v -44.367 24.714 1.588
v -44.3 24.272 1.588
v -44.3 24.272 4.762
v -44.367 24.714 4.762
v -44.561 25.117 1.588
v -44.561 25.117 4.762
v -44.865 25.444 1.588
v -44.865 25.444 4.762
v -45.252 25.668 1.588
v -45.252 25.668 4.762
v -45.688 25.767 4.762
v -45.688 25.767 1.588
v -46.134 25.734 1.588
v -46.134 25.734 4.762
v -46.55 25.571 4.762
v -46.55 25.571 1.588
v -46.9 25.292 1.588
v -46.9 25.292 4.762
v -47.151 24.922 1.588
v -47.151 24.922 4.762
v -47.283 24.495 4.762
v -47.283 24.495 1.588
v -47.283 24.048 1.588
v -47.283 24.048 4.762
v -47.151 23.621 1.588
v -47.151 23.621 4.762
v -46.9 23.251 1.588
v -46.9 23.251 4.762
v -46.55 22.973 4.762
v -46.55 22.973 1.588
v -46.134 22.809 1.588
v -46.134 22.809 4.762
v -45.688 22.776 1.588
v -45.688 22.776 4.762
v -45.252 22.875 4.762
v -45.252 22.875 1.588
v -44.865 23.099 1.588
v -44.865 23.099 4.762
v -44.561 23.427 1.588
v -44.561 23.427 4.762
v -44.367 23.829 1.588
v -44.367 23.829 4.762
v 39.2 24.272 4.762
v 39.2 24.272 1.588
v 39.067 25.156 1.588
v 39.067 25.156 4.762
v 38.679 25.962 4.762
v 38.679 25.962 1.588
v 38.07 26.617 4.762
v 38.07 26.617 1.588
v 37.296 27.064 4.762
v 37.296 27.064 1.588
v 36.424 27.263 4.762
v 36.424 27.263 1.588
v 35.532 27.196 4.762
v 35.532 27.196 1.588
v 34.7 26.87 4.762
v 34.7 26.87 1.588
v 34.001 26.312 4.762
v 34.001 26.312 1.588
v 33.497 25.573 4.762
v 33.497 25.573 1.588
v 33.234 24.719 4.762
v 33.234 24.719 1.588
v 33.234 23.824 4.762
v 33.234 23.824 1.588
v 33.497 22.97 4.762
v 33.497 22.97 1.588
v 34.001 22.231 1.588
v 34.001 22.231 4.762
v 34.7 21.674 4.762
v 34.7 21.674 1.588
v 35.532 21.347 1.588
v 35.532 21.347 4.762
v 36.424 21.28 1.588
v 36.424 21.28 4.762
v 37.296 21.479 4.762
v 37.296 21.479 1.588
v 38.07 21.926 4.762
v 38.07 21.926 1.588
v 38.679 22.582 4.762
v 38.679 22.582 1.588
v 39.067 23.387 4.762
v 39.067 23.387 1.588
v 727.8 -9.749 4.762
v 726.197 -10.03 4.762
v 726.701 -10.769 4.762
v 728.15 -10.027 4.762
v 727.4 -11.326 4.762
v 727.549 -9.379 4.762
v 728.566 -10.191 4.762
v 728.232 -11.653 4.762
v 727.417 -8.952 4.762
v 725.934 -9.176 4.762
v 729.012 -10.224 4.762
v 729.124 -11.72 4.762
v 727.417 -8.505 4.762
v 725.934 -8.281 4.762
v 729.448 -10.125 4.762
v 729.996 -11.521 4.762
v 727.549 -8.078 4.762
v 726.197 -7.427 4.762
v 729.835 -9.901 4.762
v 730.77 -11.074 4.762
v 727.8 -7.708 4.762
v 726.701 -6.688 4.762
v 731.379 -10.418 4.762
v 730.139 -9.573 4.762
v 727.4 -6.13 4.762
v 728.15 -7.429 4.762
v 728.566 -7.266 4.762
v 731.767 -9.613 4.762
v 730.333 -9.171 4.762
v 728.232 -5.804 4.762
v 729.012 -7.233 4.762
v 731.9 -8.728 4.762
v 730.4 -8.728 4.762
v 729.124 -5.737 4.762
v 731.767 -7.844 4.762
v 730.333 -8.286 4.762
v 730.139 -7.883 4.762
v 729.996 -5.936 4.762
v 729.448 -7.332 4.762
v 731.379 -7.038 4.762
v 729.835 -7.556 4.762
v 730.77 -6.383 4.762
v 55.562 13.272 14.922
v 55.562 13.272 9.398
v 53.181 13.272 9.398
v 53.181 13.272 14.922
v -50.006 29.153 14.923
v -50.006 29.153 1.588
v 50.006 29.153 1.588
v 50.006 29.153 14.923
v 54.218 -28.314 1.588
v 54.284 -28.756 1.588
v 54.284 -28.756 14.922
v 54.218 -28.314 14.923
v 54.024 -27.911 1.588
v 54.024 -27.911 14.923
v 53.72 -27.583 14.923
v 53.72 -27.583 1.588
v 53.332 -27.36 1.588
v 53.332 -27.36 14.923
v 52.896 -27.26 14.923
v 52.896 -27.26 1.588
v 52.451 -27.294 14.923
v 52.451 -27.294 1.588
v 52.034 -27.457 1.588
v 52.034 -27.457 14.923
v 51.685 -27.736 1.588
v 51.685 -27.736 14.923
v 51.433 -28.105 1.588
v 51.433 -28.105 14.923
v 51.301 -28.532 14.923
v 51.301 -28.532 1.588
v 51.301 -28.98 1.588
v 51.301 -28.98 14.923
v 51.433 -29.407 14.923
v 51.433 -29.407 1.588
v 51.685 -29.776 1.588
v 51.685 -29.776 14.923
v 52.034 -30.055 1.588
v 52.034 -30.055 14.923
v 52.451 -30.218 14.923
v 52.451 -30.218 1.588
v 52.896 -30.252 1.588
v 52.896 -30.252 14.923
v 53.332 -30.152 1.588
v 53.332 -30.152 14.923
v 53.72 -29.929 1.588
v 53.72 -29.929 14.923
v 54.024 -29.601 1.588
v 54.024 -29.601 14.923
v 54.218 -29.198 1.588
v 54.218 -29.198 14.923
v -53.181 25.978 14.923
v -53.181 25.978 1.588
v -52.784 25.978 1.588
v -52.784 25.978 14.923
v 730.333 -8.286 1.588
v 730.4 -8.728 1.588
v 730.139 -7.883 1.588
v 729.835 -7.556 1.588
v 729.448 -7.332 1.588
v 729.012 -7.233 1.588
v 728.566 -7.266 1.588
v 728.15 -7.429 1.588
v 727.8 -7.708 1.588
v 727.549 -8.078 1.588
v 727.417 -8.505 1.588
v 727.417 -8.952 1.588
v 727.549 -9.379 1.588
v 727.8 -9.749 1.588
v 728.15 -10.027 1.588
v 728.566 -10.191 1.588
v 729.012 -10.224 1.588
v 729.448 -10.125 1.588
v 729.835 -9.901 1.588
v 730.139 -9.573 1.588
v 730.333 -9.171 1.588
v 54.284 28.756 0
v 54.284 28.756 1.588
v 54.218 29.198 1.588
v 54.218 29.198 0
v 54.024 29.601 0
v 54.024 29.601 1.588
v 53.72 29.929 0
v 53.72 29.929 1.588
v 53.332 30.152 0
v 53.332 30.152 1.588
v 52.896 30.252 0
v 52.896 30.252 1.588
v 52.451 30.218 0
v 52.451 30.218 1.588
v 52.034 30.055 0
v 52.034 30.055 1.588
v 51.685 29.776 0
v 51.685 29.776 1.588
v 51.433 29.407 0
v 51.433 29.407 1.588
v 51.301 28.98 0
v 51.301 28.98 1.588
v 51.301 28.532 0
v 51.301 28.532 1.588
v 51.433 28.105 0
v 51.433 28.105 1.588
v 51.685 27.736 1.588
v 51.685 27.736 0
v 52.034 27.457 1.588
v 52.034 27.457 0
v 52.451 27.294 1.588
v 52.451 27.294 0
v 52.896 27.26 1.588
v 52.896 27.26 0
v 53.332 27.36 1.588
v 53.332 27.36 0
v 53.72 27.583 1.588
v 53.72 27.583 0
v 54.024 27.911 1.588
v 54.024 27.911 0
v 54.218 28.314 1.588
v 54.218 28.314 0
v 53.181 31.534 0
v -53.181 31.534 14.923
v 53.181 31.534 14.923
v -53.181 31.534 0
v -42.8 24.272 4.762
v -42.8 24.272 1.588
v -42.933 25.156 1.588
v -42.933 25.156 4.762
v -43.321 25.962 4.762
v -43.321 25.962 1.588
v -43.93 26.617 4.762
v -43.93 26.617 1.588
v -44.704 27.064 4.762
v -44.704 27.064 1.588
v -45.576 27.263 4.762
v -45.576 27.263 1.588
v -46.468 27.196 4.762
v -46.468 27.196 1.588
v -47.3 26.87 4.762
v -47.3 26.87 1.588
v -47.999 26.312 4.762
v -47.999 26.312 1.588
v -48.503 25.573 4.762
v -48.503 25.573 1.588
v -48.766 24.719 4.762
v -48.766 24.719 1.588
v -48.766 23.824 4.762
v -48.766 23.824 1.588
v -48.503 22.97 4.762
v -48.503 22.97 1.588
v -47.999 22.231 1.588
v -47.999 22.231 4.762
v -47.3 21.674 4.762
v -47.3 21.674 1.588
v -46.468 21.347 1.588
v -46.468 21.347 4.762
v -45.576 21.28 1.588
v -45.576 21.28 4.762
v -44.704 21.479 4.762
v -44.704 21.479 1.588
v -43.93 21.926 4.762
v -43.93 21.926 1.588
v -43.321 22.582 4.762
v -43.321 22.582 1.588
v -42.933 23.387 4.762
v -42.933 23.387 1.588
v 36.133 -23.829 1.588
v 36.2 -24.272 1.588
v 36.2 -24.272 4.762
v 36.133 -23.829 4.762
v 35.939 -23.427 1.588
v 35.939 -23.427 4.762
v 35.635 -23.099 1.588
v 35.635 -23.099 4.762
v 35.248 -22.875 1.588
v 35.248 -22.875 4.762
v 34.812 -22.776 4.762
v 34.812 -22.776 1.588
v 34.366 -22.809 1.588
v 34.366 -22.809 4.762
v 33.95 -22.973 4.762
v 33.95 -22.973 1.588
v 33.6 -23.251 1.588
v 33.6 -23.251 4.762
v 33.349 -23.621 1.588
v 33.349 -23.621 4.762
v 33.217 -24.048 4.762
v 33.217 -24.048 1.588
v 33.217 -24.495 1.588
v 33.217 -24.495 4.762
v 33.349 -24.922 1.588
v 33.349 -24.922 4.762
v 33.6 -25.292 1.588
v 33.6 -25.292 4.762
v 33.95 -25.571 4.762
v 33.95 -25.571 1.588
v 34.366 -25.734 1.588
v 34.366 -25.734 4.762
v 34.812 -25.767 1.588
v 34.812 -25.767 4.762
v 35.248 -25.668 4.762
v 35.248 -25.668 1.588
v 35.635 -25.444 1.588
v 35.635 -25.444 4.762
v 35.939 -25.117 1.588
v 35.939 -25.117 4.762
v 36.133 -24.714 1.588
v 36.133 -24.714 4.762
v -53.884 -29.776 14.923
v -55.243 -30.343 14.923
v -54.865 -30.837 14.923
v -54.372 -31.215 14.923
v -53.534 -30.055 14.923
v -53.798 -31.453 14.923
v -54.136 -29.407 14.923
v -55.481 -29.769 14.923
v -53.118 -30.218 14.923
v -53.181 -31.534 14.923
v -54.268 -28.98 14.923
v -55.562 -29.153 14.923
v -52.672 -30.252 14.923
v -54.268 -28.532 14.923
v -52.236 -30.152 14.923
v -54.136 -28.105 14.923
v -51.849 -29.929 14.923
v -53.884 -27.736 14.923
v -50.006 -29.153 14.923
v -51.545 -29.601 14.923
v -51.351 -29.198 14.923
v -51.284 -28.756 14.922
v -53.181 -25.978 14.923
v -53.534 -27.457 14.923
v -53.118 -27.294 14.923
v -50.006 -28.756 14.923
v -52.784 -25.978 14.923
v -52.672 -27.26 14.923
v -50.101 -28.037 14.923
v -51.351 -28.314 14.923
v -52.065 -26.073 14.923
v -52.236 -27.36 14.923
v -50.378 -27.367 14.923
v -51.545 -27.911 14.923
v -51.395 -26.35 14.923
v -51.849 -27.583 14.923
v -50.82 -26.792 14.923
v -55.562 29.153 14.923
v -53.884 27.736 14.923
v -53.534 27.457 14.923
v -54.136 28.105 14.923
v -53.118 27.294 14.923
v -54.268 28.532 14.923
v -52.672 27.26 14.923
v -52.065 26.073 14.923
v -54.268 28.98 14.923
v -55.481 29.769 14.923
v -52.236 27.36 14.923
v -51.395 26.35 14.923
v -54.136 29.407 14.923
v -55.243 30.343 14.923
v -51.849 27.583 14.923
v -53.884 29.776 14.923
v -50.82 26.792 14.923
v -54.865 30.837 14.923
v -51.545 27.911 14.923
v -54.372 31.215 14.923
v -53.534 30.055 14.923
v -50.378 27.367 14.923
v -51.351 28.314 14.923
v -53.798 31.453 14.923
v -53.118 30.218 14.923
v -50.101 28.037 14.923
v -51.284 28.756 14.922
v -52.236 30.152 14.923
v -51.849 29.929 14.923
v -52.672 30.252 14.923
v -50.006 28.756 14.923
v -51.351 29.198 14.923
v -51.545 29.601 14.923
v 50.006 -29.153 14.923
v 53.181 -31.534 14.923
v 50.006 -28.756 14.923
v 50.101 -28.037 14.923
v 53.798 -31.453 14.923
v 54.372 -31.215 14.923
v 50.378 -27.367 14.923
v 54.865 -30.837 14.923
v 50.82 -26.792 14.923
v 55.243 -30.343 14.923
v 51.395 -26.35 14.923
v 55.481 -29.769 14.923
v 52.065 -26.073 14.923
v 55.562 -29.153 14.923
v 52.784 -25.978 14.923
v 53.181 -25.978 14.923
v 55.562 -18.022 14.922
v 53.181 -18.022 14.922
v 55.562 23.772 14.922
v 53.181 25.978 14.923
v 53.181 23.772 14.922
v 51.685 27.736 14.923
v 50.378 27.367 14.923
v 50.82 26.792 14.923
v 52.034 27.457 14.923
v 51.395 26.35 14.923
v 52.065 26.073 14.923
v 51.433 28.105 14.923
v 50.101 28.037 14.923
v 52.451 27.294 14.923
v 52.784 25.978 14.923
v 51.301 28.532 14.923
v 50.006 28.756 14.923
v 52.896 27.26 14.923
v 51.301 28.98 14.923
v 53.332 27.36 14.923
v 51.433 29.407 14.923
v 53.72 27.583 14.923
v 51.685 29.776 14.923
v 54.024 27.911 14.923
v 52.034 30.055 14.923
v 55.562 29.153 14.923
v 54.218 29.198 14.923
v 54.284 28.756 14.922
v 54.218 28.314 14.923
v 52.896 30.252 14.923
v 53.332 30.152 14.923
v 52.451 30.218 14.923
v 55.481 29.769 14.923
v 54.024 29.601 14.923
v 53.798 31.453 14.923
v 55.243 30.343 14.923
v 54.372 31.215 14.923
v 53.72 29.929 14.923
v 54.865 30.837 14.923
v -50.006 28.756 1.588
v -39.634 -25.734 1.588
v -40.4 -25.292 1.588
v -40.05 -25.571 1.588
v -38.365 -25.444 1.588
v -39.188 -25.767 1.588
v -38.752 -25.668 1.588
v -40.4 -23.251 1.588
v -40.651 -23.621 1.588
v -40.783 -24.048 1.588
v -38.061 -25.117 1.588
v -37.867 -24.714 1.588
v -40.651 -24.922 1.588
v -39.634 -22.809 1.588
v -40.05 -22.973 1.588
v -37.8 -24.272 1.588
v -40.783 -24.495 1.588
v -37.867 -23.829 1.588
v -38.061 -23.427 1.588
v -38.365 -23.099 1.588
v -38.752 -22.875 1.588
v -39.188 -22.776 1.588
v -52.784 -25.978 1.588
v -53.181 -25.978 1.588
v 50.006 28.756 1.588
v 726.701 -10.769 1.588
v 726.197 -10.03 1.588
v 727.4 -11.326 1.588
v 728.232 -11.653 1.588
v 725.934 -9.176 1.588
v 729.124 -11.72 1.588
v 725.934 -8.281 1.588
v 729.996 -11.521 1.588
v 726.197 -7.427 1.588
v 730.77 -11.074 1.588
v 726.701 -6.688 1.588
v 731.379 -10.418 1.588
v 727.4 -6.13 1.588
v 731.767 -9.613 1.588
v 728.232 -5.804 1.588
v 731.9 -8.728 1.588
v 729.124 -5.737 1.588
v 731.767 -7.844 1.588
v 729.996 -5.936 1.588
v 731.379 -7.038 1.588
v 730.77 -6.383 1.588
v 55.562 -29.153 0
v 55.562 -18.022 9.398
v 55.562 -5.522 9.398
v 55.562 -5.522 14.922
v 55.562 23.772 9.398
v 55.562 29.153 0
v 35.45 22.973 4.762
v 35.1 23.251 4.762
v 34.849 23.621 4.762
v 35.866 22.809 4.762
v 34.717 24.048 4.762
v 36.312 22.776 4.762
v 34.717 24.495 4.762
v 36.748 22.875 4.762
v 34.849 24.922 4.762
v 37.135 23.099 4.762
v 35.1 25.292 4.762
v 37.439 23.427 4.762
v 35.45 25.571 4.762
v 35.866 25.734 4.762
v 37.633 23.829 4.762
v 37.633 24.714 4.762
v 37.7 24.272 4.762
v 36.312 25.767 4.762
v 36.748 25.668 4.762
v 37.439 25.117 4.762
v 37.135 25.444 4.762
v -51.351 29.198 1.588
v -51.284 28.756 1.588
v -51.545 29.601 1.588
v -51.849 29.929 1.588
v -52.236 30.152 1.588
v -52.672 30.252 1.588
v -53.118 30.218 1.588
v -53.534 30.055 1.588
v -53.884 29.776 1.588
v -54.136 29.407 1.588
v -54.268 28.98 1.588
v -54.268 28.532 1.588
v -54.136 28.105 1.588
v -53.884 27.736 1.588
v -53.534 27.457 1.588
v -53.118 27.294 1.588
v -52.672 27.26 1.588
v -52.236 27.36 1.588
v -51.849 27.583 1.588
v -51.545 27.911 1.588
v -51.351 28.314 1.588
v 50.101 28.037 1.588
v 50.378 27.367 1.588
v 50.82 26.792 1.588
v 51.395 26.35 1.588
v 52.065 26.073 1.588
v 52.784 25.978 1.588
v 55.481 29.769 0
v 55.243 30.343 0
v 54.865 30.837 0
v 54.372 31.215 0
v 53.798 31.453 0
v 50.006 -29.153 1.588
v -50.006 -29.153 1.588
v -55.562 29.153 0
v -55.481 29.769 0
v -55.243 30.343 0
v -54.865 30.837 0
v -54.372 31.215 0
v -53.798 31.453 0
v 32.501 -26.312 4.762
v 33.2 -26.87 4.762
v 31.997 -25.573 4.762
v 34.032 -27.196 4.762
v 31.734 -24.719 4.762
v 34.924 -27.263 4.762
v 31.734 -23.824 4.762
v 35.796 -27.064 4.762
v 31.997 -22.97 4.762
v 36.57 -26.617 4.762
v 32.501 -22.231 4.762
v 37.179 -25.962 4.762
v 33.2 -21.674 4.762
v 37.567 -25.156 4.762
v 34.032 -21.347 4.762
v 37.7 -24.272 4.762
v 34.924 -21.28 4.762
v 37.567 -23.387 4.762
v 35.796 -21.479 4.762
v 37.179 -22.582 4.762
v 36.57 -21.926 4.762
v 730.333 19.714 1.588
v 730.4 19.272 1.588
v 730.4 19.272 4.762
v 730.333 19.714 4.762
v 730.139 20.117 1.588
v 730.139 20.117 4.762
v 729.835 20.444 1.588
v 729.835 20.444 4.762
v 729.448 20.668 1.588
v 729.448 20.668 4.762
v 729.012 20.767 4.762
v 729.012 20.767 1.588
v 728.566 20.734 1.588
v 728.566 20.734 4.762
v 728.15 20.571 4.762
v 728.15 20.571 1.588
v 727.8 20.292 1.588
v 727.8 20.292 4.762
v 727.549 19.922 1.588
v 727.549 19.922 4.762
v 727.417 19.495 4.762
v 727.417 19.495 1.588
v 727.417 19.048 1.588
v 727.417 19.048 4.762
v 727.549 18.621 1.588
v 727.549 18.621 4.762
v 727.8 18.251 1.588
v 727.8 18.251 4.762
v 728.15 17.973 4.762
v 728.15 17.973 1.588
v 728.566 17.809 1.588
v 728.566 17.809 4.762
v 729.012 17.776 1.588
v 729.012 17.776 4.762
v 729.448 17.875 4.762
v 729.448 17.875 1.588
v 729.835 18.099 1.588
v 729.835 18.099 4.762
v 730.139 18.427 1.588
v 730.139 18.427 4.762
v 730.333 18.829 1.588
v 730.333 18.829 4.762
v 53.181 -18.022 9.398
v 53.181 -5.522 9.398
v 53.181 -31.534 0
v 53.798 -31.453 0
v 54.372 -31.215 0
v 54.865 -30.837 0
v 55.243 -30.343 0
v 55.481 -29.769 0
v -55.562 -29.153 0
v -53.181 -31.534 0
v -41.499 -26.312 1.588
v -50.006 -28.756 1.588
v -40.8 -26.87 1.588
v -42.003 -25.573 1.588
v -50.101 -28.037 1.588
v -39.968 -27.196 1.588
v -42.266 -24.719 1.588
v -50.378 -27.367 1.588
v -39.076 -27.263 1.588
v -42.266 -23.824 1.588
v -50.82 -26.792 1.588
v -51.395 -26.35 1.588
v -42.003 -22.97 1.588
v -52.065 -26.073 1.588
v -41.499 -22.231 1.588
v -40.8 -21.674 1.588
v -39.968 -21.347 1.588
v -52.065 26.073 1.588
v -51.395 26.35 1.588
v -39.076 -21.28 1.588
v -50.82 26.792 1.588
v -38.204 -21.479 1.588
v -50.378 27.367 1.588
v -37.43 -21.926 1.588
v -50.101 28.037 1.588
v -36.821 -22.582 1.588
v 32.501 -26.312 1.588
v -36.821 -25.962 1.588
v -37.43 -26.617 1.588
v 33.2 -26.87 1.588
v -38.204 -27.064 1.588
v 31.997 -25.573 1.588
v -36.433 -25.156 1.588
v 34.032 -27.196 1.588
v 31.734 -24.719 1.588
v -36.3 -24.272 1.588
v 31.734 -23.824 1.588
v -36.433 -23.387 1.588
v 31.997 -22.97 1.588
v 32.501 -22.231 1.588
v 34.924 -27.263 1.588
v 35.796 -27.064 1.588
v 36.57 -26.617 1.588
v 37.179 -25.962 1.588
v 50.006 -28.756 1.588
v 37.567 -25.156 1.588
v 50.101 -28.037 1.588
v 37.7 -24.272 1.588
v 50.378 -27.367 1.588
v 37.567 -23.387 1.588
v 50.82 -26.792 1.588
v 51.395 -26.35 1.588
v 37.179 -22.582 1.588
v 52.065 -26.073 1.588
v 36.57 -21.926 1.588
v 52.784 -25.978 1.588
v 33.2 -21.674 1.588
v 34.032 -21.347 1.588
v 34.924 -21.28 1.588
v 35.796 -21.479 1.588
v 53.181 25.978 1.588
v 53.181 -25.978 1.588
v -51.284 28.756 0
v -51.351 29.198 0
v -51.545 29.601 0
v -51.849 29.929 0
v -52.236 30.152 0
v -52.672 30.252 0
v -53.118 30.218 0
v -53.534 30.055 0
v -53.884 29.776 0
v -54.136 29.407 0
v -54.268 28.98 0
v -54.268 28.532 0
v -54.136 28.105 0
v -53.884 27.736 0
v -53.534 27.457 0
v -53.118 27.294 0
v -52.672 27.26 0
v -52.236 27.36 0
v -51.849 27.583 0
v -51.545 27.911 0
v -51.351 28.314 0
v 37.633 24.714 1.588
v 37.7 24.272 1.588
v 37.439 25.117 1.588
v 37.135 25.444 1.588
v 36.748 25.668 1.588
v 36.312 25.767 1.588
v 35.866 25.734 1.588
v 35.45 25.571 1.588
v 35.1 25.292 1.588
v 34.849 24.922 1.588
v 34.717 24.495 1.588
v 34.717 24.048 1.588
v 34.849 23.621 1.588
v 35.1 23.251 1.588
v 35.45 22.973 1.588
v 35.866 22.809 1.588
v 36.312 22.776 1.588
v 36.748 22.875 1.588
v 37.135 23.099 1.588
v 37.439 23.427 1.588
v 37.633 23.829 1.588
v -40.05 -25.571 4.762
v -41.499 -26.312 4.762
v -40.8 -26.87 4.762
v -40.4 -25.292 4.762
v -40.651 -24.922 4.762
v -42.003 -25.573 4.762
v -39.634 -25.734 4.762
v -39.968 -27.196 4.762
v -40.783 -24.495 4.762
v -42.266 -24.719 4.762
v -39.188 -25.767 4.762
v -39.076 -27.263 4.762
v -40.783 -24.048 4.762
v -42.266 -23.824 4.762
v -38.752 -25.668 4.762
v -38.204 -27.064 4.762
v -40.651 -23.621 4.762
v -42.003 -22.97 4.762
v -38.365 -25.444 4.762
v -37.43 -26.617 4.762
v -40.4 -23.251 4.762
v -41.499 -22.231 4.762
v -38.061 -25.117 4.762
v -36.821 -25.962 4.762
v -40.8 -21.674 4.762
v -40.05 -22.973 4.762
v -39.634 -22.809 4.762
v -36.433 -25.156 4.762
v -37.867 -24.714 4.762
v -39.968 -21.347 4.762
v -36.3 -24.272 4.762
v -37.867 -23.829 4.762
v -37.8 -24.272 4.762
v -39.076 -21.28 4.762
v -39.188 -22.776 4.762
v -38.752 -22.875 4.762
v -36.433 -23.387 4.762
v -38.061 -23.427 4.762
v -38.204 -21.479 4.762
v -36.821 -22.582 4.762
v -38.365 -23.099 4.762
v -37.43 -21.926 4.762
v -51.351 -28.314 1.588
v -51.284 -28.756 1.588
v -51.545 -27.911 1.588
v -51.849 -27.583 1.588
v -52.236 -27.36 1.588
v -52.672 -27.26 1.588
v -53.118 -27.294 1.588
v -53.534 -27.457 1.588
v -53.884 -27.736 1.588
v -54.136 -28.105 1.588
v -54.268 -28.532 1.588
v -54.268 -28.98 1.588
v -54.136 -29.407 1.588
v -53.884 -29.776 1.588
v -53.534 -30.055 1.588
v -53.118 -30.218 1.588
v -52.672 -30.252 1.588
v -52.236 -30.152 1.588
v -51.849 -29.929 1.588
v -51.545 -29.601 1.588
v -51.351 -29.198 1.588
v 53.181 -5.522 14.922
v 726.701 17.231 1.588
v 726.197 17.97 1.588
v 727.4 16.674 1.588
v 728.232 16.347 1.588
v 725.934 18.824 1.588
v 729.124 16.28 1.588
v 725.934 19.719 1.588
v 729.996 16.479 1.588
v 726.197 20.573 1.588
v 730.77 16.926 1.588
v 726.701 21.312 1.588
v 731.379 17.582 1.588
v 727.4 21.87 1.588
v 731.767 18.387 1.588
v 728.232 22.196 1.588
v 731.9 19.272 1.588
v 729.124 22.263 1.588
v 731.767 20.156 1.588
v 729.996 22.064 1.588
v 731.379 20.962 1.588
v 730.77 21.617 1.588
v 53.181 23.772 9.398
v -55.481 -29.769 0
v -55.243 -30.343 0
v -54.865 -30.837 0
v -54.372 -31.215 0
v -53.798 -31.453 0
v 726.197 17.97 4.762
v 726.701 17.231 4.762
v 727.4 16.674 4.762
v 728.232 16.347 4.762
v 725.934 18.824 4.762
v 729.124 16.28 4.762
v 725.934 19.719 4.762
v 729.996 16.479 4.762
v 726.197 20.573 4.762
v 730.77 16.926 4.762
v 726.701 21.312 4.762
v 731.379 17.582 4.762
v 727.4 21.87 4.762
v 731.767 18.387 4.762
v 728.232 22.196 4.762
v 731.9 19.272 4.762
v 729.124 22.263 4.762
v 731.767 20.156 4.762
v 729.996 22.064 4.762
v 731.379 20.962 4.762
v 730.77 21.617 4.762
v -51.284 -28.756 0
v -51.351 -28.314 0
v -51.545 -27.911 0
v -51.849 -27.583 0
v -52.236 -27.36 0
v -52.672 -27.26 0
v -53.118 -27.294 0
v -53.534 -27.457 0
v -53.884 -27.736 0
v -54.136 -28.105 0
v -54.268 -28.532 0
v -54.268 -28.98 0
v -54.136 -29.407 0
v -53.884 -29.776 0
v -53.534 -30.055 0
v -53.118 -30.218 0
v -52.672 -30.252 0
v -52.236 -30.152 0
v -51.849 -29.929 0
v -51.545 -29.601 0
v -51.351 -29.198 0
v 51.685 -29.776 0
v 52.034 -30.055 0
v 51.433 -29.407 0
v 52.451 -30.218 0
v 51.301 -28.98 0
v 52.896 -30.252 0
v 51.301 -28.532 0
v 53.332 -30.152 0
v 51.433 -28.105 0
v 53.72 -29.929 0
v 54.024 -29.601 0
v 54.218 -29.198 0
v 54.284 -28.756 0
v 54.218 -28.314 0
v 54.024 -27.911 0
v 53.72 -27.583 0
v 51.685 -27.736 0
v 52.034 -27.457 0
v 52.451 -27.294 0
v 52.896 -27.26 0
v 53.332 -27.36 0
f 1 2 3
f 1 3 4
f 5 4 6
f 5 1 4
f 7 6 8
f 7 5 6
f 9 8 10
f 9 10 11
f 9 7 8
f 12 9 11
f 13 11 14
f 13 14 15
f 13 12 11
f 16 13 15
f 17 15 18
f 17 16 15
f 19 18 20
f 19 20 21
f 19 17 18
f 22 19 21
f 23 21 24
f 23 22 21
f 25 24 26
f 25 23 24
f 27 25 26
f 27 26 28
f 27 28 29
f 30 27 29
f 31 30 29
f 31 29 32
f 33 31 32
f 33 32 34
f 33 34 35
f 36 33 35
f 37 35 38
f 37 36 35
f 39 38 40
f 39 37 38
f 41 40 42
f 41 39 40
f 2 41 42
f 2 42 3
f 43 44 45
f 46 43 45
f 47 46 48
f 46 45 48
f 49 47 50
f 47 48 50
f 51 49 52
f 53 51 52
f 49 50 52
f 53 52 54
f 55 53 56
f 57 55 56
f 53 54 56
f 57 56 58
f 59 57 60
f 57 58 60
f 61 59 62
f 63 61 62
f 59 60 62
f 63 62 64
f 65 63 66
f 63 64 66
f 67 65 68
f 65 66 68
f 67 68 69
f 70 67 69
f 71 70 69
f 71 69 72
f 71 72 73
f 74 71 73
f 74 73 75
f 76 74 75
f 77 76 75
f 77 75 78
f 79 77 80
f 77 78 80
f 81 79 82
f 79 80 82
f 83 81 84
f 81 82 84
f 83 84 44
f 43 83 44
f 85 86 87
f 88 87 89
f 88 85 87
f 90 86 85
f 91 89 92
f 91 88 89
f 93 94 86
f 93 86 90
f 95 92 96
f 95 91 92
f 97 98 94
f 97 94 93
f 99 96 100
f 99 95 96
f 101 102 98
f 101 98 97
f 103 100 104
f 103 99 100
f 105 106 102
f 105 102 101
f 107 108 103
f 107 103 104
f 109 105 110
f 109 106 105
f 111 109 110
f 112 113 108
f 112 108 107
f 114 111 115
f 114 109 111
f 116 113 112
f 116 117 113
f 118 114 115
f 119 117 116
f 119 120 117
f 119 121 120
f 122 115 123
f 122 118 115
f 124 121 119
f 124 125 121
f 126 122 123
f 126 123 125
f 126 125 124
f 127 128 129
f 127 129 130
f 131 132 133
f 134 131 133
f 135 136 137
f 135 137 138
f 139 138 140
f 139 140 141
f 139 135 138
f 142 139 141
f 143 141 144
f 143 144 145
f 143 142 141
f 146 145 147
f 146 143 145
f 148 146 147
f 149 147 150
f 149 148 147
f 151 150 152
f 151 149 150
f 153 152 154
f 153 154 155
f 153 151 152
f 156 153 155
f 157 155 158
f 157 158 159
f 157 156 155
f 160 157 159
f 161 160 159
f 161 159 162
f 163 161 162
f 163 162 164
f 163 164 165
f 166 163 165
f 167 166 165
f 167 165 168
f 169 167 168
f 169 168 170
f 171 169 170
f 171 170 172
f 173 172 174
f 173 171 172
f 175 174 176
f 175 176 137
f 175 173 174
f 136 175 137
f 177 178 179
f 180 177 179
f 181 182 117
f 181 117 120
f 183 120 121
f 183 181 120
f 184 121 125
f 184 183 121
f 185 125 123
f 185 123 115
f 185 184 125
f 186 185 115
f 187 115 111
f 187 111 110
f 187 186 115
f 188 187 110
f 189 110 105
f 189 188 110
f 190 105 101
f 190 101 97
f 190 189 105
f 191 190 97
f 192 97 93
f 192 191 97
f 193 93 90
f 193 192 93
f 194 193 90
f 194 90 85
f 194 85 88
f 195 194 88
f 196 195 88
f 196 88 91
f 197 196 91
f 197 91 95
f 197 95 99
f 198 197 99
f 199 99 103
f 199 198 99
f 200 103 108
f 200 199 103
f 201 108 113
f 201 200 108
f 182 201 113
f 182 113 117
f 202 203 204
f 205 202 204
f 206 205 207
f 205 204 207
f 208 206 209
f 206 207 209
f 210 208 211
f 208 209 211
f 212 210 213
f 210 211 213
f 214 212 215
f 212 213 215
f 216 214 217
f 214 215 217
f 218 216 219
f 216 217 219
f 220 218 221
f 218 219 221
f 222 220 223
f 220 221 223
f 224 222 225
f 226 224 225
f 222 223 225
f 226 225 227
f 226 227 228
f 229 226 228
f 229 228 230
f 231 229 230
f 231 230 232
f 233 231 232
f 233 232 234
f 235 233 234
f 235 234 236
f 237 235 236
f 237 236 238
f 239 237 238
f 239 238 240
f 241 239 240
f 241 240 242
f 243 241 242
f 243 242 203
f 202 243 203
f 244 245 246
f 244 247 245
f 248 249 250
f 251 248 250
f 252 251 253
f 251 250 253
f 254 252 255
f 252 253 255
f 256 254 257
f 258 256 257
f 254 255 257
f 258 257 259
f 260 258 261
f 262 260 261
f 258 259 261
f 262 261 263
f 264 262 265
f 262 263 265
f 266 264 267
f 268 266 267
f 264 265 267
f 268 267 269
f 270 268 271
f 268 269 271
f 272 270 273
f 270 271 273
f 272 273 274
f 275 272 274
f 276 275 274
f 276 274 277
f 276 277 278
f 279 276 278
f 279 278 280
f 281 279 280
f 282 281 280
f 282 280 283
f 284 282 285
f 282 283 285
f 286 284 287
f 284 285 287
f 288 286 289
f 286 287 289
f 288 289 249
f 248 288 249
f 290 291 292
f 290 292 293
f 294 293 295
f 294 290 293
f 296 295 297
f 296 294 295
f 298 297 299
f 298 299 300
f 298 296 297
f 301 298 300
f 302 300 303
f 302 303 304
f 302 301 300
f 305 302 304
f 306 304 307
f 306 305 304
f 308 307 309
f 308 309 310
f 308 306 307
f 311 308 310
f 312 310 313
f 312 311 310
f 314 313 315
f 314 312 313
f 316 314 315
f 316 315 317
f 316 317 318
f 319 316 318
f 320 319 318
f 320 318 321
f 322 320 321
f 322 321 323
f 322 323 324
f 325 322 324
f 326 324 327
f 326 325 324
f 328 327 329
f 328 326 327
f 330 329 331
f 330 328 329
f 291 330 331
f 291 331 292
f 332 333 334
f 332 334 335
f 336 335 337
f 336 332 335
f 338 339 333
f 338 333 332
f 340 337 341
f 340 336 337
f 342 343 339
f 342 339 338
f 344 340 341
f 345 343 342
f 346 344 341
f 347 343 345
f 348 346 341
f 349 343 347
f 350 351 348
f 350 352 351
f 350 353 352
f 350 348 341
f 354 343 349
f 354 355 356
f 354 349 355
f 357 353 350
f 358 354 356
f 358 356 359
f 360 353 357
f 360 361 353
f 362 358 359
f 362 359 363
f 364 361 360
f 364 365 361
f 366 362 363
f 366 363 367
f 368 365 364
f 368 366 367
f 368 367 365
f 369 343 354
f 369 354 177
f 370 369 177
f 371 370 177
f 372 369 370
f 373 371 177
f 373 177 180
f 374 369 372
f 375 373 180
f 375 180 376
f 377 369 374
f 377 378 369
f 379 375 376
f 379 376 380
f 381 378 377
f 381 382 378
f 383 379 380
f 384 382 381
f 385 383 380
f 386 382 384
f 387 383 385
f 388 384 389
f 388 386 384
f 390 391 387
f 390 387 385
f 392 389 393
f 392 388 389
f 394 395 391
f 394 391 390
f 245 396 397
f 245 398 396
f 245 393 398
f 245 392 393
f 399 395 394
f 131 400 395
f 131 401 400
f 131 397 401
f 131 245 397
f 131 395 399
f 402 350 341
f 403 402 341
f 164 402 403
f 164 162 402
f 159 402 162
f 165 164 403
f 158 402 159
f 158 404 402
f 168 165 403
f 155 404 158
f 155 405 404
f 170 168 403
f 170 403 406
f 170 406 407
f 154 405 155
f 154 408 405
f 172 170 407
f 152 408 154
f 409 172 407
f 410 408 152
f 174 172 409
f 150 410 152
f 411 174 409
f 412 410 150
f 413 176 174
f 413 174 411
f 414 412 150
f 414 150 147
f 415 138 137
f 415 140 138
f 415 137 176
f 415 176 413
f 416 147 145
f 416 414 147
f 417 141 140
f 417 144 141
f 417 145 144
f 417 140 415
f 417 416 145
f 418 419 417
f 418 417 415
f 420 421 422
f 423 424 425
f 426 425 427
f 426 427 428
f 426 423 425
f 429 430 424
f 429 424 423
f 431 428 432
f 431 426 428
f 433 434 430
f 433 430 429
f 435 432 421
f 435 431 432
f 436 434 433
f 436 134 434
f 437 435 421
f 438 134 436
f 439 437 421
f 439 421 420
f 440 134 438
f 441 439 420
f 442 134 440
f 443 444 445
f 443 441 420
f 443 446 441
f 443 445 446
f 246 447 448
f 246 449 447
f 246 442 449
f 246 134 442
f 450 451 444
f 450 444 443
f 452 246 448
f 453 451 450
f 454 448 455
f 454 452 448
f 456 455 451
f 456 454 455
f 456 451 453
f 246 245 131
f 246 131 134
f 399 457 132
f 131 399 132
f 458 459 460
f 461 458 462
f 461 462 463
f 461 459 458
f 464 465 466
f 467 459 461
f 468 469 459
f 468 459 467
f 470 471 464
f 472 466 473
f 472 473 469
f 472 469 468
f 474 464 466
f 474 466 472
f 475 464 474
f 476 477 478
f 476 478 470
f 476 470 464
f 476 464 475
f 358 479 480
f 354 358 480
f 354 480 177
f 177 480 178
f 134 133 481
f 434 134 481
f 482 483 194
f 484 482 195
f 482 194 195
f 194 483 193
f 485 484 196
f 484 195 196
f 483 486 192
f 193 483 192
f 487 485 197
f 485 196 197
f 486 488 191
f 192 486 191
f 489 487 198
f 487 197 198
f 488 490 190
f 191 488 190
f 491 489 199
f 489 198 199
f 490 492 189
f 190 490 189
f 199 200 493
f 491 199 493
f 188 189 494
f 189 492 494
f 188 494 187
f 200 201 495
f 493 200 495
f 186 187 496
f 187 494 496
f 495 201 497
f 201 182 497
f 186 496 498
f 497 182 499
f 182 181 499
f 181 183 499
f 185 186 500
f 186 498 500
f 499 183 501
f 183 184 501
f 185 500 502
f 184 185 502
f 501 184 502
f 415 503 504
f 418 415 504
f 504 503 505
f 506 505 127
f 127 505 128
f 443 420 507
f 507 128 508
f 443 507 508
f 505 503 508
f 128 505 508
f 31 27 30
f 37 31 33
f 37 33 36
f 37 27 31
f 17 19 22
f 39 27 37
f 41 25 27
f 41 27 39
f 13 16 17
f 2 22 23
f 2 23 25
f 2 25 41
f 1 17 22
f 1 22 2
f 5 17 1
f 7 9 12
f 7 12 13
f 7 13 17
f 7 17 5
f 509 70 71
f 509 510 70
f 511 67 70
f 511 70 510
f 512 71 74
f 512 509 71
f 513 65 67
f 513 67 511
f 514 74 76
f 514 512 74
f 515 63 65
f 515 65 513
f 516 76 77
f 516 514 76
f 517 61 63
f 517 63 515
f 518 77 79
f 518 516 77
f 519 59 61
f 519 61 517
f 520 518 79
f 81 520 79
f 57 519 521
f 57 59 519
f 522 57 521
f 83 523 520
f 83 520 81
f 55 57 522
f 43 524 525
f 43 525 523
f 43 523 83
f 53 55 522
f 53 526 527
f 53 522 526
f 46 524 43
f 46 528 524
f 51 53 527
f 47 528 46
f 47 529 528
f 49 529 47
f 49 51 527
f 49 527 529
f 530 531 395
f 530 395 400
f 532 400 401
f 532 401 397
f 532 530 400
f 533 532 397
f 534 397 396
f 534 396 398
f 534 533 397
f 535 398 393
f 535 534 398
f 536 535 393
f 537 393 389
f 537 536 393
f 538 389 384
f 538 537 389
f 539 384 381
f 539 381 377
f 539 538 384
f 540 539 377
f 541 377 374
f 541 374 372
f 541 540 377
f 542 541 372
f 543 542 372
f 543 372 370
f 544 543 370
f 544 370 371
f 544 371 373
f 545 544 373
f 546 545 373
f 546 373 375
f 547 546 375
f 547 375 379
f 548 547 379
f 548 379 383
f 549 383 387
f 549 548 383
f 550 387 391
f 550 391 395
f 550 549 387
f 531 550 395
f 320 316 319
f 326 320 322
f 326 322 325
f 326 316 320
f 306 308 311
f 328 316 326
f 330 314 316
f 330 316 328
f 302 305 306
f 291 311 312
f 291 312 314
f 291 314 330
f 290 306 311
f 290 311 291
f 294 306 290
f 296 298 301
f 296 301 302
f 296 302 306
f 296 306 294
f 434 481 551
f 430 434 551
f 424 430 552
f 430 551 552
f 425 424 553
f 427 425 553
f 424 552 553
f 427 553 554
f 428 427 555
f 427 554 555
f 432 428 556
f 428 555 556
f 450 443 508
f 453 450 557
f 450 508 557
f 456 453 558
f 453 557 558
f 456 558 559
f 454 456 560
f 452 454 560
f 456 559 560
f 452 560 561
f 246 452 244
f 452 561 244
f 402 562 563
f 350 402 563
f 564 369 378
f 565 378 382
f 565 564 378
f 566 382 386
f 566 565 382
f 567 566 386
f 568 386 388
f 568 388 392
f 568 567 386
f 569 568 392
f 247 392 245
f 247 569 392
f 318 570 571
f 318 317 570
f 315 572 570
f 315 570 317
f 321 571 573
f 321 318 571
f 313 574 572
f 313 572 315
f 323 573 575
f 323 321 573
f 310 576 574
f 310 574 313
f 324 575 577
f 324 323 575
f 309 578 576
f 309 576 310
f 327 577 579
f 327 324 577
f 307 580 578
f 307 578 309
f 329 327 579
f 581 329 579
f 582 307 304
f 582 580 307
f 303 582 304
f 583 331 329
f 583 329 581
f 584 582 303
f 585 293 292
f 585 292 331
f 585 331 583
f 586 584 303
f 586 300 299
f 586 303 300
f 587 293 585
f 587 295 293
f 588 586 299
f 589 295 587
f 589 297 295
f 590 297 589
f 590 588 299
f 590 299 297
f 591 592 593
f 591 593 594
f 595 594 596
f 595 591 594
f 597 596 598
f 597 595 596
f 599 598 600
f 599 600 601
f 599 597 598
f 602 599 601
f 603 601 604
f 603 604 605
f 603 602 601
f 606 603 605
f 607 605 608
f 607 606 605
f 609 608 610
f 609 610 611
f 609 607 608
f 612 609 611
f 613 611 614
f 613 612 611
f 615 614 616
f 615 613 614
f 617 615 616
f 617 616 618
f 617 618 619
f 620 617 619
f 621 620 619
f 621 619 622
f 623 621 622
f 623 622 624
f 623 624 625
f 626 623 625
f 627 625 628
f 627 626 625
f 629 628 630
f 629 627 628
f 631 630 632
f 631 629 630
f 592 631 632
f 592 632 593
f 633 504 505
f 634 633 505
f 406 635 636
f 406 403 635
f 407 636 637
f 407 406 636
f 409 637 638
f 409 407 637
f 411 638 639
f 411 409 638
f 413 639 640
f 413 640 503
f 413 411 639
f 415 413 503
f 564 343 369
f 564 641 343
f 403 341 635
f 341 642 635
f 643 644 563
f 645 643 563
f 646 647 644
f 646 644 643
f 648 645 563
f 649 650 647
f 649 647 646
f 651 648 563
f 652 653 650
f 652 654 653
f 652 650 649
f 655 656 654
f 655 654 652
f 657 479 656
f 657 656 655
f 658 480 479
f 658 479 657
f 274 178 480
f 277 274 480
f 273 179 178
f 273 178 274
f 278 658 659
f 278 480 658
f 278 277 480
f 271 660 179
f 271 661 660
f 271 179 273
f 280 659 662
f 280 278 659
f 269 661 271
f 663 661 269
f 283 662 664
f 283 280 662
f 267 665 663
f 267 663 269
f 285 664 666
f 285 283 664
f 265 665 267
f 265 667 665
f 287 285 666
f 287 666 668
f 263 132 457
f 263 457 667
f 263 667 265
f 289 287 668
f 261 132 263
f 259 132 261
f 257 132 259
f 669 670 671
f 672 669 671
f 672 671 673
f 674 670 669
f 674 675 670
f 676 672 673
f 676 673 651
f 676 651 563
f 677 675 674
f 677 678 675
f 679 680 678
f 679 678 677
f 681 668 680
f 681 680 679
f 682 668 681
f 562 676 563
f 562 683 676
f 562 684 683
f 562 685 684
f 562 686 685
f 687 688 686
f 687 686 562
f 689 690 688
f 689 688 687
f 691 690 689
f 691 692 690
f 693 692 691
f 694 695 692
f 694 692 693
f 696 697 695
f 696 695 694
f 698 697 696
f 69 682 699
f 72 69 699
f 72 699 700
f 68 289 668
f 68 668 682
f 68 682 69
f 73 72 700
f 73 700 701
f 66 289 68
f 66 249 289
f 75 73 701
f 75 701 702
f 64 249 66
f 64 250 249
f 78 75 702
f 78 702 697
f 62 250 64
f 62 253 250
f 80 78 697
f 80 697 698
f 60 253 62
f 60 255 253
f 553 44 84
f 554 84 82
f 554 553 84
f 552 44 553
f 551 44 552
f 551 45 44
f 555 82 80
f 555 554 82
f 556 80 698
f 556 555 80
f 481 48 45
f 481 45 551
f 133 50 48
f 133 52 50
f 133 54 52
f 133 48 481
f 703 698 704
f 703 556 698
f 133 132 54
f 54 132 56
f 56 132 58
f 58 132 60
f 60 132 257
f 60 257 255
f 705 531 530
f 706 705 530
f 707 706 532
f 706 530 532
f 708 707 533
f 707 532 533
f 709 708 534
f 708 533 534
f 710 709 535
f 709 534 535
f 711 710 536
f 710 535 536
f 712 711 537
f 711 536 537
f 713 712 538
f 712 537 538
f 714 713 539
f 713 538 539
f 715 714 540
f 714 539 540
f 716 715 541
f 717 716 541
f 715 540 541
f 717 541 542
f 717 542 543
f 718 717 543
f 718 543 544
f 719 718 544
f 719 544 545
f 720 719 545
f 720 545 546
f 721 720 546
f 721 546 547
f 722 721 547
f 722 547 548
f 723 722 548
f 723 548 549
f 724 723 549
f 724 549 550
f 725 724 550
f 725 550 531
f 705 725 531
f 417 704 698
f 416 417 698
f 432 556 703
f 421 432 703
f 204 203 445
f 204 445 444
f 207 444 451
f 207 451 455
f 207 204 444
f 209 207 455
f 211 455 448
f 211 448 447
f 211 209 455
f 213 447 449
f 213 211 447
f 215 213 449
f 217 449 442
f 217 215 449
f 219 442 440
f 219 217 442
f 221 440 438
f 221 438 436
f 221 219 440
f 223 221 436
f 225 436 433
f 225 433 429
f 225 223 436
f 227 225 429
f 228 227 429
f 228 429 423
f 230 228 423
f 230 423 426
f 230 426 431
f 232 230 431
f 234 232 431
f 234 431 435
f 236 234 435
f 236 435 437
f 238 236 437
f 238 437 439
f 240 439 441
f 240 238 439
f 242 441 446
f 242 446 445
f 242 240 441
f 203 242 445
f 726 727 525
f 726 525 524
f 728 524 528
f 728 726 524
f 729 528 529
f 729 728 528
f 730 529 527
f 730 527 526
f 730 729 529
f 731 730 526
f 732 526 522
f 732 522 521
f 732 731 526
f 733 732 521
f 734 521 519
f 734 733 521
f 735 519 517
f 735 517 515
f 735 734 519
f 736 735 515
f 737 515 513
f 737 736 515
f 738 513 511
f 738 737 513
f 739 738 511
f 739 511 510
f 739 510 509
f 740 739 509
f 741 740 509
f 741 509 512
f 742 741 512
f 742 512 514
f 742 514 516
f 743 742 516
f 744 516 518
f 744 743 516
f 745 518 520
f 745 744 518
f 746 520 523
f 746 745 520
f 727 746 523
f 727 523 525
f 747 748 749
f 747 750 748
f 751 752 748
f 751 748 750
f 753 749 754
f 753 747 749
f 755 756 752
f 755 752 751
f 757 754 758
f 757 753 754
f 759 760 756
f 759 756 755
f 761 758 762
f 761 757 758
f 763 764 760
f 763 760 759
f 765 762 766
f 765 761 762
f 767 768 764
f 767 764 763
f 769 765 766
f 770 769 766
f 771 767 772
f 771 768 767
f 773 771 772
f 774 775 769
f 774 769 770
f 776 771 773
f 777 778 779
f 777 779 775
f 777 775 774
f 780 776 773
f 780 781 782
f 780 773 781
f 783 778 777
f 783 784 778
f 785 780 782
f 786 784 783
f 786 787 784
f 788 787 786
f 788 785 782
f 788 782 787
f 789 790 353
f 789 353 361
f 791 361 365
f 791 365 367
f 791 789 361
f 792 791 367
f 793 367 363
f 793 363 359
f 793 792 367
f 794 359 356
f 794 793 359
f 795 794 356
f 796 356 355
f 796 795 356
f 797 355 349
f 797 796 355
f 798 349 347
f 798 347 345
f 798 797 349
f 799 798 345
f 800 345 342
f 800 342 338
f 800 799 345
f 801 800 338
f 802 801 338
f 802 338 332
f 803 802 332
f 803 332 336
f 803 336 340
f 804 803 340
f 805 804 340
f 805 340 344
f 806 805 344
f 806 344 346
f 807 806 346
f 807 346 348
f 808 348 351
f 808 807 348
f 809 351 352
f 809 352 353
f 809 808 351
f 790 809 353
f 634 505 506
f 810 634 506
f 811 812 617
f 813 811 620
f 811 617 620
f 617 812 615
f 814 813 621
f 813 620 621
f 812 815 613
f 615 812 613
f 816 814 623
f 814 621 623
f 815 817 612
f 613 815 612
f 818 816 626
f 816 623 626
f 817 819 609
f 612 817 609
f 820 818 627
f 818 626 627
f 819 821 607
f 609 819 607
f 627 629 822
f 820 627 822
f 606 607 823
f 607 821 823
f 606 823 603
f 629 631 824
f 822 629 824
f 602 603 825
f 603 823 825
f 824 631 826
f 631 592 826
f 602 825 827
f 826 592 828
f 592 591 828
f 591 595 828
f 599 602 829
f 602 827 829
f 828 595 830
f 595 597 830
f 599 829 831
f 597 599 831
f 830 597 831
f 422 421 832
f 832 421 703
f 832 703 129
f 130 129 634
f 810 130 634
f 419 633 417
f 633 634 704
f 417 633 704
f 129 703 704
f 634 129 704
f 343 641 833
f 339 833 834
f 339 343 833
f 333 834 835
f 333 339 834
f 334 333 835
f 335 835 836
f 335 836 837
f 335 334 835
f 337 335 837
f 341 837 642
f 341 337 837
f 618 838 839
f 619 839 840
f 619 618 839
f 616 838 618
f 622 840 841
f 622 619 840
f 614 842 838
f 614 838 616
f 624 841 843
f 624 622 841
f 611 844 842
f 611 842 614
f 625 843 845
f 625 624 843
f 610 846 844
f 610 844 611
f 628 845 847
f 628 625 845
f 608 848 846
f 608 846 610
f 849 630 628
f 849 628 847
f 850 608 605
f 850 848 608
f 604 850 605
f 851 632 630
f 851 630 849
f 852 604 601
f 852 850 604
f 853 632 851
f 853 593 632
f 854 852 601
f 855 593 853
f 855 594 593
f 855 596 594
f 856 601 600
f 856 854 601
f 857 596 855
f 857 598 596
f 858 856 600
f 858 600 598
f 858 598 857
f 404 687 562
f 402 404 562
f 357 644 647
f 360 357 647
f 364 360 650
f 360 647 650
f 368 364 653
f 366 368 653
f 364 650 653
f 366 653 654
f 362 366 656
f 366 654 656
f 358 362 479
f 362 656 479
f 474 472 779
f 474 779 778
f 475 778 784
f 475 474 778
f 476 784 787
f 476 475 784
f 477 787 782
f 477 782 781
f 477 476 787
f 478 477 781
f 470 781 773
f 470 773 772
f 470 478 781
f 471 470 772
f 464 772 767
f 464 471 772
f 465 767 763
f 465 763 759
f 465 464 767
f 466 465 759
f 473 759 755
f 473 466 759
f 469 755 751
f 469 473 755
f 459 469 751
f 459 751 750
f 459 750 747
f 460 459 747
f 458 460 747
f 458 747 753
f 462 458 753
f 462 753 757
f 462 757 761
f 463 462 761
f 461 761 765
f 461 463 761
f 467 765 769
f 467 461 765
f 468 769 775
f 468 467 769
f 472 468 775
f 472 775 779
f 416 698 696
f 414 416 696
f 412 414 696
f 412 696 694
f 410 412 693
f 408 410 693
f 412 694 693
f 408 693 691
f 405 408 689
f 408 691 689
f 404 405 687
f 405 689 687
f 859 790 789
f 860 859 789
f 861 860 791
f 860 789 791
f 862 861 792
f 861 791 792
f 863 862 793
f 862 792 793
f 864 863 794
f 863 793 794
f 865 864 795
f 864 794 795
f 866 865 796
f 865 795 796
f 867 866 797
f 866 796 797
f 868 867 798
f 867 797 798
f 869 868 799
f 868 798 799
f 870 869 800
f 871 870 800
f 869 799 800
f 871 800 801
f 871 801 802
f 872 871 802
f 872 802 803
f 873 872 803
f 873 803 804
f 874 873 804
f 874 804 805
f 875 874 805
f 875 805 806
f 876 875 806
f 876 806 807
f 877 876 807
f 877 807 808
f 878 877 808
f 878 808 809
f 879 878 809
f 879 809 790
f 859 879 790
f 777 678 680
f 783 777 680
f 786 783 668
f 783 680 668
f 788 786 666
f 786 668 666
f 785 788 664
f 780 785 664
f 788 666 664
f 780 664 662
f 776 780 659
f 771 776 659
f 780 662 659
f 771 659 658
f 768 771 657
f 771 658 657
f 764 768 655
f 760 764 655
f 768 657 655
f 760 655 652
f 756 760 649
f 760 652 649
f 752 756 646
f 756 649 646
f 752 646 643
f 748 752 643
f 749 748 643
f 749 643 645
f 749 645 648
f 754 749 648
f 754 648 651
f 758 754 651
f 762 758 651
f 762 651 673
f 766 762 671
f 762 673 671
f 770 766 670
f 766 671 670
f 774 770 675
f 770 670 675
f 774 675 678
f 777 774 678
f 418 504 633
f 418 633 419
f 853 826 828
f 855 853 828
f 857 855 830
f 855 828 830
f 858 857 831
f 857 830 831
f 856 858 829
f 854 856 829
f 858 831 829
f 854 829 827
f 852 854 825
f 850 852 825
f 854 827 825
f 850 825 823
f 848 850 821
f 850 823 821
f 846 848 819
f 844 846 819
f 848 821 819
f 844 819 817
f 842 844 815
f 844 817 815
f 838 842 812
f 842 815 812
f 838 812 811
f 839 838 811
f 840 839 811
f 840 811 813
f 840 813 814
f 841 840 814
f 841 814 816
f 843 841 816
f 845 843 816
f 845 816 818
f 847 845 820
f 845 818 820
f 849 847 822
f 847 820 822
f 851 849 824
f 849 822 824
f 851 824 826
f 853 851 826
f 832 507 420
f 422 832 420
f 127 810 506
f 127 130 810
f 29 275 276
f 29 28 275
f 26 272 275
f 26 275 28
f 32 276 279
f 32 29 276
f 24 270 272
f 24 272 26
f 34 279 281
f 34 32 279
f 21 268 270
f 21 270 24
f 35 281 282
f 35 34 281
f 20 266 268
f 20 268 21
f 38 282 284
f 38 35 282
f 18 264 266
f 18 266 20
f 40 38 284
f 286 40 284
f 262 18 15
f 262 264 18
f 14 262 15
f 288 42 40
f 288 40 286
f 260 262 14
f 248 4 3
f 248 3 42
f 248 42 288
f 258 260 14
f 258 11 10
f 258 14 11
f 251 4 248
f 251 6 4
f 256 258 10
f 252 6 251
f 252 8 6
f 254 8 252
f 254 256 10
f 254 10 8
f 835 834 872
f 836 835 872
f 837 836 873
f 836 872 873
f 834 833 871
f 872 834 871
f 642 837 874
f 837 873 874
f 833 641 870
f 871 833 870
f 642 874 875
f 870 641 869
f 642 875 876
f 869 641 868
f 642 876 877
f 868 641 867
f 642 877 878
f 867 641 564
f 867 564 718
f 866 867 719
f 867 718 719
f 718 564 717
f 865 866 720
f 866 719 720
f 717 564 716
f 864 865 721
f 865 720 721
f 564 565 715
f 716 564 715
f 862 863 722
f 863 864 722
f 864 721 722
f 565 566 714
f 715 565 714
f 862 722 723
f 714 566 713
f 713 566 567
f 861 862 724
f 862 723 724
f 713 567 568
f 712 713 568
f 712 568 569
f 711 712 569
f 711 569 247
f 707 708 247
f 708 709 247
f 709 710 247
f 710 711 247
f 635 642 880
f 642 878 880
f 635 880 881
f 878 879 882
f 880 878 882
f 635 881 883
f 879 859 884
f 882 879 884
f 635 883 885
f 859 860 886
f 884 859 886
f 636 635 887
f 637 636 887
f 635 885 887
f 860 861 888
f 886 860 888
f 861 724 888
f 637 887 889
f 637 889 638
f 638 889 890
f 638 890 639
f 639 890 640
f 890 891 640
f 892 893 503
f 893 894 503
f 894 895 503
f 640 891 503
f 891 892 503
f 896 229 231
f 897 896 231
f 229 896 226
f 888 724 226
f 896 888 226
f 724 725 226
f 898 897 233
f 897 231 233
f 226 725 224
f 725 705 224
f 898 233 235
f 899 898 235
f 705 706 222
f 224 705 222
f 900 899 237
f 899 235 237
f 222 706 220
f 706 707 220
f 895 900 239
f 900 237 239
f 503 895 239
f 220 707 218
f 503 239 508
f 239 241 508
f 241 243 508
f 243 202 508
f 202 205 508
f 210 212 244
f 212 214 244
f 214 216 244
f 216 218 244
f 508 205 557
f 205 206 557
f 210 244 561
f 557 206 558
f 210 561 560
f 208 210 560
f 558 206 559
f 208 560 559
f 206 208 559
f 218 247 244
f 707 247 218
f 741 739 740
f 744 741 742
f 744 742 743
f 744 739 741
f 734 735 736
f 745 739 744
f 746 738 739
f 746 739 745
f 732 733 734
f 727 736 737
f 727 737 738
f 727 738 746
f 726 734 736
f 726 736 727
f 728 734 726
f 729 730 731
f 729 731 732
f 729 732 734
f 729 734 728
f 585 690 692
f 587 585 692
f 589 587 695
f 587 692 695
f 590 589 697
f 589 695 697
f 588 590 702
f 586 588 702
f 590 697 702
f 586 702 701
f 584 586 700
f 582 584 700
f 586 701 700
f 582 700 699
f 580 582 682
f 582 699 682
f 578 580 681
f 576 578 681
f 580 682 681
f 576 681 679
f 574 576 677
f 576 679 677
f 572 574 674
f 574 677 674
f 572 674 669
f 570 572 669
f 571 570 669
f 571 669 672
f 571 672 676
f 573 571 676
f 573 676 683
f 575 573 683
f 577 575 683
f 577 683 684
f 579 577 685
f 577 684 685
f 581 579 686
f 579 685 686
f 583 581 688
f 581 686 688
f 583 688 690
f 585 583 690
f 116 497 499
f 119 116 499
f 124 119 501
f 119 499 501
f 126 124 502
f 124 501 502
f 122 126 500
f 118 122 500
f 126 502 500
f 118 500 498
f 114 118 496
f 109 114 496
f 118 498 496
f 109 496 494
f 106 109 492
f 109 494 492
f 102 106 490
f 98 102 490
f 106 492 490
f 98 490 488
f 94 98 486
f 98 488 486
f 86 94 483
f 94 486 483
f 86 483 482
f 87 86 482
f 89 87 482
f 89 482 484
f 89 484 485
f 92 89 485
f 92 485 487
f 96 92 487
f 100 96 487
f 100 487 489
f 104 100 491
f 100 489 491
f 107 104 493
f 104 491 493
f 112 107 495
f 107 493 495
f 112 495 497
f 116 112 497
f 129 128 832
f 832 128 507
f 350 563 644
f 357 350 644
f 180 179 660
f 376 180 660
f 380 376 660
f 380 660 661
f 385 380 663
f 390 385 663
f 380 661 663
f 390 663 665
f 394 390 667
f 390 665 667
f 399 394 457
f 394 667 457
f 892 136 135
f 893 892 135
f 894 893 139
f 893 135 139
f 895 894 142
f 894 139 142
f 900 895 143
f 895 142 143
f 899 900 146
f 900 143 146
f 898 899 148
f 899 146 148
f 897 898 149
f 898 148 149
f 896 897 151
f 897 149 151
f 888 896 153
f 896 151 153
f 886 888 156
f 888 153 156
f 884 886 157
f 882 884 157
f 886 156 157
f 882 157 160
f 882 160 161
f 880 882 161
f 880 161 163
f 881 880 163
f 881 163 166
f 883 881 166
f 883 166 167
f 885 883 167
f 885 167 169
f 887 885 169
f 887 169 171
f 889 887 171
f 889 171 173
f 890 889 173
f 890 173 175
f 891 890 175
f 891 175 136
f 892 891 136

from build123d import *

# Parameters (mm, degrees)
F1_W      = 111.125
F1_H      = 63.0682
F2_DEPTH  = 1.5875
F3_W      = 111.125
F3_H      = 63.0682
F3_R      = 1.5
F4_DEPTH  = 13.335
F5_R      = 2.38125
F6_W      = 12.5
F6_H      = 5.5245
F6_W_2    = 10.5
F7_DEPTH  = 2.38125
F8_R      = 3
F8_R_2    = 1.5
F9_DEPTH  = 3.175
F10_R     = 1.5
F11_DEPTH = 14.9235


with BuildPart() as f2:
    # F1 (on Top) → F2 (new body)
    with BuildSketch(Plane.XY):
        Rectangle(F1_W, F1_H)
    extrude(amount=F2_DEPTH)

    # F3 (on face) → F4 (join)
    with BuildSketch(Plane.XY.offset(1.5875)):
        Rectangle(F3_W, F3_H)
        with Locations((-52.784375, -28.755975)):
            Circle(F3_R, mode=Mode.SUBTRACT)
        with Locations((52.784375, -28.755975)):
            Circle(F3_R, mode=Mode.SUBTRACT)
        with BuildLine():
            Line((52.784375, 25.97785), (53.18125, 25.97785))
            Line((53.18125, 25.97785), (53.18125, -25.97785))
            Line((53.18125, -25.97785), (52.784375, -25.97785))
            ThreePointArc((52.784375, -25.97785), (50.819944, -26.791544), (50.00625, -28.755975))
            Line((50.00625, -28.755975), (50.00625, -29.15285))
            Line((50.00625, -29.15285), (-50.00625, -29.15285))
            Line((-50.00625, -29.15285), (-50.00625, -28.755975))
            ThreePointArc((-50.00625, -28.755975), (-50.819944, -26.791544), (-52.784375, -25.97785))
            Line((-52.784375, -25.97785), (-53.18125, -25.97785))
            Line((-53.18125, -25.97785), (-53.18125, 25.97785))
            Line((-53.18125, 25.97785), (-52.784375, 25.97785))
            ThreePointArc((-52.784375, 25.97785), (-50.819944, 26.791544), (-50.00625, 28.755975))
            Line((-50.00625, 28.755975), (-50.00625, 29.15285))
            Line((-50.00625, 29.15285), (50.00625, 29.15285))
            Line((50.00625, 29.15285), (50.00625, 28.755975))
            ThreePointArc((50.00625, 28.755975), (50.819944, 26.791544), (52.784375, 25.97785))
        make_face(mode=Mode.SUBTRACT)
        with Locations((-52.784375, 28.755975)):
            Circle(F3_R, mode=Mode.SUBTRACT)
        with Locations((52.784375, 28.755975)):
            Circle(F3_R, mode=Mode.SUBTRACT)
    extrude(amount=F4_DEPTH)

    # F5
    f5_edges = [f2.edges().sort_by_distance(p)[0] for p in [
        (55.5625, -31.5341, 7.46125),
        (55.5625, 31.5341, 7.46125),
        (-55.5625, -31.5341, 7.46125),
        (-55.5625, 31.5341, 7.46125),
    ]]
    fillet(f5_edges, radius=F5_R)

    # F6 (on face) → F7 (cut, through all)
    with BuildSketch(Plane.YZ.offset(55.5625)):
        with Locations((-11.7716, 12.16025)):
            Rectangle(F6_W, F6_H)
        with Locations((18.5216, 12.16025)):
            Rectangle(F6_W_2, F6_H)
    extrude(amount=-F7_DEPTH, mode=Mode.SUBTRACT)

    # F8 (on face) → F9 (join)
    with BuildSketch(Plane.XY.offset(1.5875)):
        with Locations((-45.8, 24.2716)):
            Circle(F8_R)
        with Locations((-45.8, 24.2716)):
            Circle(F8_R_2, mode=Mode.SUBTRACT)
        with Locations((-39.3, -24.2716)):
            Circle(F8_R)
        with Locations((-39.3, -24.2716)):
            Circle(F8_R_2, mode=Mode.SUBTRACT)
        with Locations((728.9, 19.2716)):
            Circle(F8_R)
        with Locations((728.9, 19.2716)):
            Circle(F8_R_2, mode=Mode.SUBTRACT)
        with Locations((728.9, -8.7284)):
            Circle(F8_R)
        with Locations((728.9, -8.7284)):
            Circle(F8_R_2, mode=Mode.SUBTRACT)
        with Locations((36.2, 24.2716)):
            Circle(F8_R)
        with Locations((36.2, 24.2716)):
            Circle(F8_R_2, mode=Mode.SUBTRACT)
        with Locations((34.7, -24.2716)):
            Circle(F8_R)
        with Locations((34.7, -24.2716)):
            Circle(F8_R_2, mode=Mode.SUBTRACT)
    extrude(amount=F9_DEPTH)

    # F10 (on face) → F11 (cut, through all)
    with BuildSketch(Plane.XY.offset(14.9225)):
        with Locations((-52.784375, 28.755975)):
            Circle(F10_R)
        with Locations((-52.784375, -28.755975)):
            Circle(F10_R)
        with Locations((52.784375, -28.755975)):
            Circle(F10_R)
        with Locations((52.784375, 28.755975)):
            Circle(F10_R)
    extrude(amount=-F11_DEPTH, mode=Mode.SUBTRACT)


solid = f2.part
